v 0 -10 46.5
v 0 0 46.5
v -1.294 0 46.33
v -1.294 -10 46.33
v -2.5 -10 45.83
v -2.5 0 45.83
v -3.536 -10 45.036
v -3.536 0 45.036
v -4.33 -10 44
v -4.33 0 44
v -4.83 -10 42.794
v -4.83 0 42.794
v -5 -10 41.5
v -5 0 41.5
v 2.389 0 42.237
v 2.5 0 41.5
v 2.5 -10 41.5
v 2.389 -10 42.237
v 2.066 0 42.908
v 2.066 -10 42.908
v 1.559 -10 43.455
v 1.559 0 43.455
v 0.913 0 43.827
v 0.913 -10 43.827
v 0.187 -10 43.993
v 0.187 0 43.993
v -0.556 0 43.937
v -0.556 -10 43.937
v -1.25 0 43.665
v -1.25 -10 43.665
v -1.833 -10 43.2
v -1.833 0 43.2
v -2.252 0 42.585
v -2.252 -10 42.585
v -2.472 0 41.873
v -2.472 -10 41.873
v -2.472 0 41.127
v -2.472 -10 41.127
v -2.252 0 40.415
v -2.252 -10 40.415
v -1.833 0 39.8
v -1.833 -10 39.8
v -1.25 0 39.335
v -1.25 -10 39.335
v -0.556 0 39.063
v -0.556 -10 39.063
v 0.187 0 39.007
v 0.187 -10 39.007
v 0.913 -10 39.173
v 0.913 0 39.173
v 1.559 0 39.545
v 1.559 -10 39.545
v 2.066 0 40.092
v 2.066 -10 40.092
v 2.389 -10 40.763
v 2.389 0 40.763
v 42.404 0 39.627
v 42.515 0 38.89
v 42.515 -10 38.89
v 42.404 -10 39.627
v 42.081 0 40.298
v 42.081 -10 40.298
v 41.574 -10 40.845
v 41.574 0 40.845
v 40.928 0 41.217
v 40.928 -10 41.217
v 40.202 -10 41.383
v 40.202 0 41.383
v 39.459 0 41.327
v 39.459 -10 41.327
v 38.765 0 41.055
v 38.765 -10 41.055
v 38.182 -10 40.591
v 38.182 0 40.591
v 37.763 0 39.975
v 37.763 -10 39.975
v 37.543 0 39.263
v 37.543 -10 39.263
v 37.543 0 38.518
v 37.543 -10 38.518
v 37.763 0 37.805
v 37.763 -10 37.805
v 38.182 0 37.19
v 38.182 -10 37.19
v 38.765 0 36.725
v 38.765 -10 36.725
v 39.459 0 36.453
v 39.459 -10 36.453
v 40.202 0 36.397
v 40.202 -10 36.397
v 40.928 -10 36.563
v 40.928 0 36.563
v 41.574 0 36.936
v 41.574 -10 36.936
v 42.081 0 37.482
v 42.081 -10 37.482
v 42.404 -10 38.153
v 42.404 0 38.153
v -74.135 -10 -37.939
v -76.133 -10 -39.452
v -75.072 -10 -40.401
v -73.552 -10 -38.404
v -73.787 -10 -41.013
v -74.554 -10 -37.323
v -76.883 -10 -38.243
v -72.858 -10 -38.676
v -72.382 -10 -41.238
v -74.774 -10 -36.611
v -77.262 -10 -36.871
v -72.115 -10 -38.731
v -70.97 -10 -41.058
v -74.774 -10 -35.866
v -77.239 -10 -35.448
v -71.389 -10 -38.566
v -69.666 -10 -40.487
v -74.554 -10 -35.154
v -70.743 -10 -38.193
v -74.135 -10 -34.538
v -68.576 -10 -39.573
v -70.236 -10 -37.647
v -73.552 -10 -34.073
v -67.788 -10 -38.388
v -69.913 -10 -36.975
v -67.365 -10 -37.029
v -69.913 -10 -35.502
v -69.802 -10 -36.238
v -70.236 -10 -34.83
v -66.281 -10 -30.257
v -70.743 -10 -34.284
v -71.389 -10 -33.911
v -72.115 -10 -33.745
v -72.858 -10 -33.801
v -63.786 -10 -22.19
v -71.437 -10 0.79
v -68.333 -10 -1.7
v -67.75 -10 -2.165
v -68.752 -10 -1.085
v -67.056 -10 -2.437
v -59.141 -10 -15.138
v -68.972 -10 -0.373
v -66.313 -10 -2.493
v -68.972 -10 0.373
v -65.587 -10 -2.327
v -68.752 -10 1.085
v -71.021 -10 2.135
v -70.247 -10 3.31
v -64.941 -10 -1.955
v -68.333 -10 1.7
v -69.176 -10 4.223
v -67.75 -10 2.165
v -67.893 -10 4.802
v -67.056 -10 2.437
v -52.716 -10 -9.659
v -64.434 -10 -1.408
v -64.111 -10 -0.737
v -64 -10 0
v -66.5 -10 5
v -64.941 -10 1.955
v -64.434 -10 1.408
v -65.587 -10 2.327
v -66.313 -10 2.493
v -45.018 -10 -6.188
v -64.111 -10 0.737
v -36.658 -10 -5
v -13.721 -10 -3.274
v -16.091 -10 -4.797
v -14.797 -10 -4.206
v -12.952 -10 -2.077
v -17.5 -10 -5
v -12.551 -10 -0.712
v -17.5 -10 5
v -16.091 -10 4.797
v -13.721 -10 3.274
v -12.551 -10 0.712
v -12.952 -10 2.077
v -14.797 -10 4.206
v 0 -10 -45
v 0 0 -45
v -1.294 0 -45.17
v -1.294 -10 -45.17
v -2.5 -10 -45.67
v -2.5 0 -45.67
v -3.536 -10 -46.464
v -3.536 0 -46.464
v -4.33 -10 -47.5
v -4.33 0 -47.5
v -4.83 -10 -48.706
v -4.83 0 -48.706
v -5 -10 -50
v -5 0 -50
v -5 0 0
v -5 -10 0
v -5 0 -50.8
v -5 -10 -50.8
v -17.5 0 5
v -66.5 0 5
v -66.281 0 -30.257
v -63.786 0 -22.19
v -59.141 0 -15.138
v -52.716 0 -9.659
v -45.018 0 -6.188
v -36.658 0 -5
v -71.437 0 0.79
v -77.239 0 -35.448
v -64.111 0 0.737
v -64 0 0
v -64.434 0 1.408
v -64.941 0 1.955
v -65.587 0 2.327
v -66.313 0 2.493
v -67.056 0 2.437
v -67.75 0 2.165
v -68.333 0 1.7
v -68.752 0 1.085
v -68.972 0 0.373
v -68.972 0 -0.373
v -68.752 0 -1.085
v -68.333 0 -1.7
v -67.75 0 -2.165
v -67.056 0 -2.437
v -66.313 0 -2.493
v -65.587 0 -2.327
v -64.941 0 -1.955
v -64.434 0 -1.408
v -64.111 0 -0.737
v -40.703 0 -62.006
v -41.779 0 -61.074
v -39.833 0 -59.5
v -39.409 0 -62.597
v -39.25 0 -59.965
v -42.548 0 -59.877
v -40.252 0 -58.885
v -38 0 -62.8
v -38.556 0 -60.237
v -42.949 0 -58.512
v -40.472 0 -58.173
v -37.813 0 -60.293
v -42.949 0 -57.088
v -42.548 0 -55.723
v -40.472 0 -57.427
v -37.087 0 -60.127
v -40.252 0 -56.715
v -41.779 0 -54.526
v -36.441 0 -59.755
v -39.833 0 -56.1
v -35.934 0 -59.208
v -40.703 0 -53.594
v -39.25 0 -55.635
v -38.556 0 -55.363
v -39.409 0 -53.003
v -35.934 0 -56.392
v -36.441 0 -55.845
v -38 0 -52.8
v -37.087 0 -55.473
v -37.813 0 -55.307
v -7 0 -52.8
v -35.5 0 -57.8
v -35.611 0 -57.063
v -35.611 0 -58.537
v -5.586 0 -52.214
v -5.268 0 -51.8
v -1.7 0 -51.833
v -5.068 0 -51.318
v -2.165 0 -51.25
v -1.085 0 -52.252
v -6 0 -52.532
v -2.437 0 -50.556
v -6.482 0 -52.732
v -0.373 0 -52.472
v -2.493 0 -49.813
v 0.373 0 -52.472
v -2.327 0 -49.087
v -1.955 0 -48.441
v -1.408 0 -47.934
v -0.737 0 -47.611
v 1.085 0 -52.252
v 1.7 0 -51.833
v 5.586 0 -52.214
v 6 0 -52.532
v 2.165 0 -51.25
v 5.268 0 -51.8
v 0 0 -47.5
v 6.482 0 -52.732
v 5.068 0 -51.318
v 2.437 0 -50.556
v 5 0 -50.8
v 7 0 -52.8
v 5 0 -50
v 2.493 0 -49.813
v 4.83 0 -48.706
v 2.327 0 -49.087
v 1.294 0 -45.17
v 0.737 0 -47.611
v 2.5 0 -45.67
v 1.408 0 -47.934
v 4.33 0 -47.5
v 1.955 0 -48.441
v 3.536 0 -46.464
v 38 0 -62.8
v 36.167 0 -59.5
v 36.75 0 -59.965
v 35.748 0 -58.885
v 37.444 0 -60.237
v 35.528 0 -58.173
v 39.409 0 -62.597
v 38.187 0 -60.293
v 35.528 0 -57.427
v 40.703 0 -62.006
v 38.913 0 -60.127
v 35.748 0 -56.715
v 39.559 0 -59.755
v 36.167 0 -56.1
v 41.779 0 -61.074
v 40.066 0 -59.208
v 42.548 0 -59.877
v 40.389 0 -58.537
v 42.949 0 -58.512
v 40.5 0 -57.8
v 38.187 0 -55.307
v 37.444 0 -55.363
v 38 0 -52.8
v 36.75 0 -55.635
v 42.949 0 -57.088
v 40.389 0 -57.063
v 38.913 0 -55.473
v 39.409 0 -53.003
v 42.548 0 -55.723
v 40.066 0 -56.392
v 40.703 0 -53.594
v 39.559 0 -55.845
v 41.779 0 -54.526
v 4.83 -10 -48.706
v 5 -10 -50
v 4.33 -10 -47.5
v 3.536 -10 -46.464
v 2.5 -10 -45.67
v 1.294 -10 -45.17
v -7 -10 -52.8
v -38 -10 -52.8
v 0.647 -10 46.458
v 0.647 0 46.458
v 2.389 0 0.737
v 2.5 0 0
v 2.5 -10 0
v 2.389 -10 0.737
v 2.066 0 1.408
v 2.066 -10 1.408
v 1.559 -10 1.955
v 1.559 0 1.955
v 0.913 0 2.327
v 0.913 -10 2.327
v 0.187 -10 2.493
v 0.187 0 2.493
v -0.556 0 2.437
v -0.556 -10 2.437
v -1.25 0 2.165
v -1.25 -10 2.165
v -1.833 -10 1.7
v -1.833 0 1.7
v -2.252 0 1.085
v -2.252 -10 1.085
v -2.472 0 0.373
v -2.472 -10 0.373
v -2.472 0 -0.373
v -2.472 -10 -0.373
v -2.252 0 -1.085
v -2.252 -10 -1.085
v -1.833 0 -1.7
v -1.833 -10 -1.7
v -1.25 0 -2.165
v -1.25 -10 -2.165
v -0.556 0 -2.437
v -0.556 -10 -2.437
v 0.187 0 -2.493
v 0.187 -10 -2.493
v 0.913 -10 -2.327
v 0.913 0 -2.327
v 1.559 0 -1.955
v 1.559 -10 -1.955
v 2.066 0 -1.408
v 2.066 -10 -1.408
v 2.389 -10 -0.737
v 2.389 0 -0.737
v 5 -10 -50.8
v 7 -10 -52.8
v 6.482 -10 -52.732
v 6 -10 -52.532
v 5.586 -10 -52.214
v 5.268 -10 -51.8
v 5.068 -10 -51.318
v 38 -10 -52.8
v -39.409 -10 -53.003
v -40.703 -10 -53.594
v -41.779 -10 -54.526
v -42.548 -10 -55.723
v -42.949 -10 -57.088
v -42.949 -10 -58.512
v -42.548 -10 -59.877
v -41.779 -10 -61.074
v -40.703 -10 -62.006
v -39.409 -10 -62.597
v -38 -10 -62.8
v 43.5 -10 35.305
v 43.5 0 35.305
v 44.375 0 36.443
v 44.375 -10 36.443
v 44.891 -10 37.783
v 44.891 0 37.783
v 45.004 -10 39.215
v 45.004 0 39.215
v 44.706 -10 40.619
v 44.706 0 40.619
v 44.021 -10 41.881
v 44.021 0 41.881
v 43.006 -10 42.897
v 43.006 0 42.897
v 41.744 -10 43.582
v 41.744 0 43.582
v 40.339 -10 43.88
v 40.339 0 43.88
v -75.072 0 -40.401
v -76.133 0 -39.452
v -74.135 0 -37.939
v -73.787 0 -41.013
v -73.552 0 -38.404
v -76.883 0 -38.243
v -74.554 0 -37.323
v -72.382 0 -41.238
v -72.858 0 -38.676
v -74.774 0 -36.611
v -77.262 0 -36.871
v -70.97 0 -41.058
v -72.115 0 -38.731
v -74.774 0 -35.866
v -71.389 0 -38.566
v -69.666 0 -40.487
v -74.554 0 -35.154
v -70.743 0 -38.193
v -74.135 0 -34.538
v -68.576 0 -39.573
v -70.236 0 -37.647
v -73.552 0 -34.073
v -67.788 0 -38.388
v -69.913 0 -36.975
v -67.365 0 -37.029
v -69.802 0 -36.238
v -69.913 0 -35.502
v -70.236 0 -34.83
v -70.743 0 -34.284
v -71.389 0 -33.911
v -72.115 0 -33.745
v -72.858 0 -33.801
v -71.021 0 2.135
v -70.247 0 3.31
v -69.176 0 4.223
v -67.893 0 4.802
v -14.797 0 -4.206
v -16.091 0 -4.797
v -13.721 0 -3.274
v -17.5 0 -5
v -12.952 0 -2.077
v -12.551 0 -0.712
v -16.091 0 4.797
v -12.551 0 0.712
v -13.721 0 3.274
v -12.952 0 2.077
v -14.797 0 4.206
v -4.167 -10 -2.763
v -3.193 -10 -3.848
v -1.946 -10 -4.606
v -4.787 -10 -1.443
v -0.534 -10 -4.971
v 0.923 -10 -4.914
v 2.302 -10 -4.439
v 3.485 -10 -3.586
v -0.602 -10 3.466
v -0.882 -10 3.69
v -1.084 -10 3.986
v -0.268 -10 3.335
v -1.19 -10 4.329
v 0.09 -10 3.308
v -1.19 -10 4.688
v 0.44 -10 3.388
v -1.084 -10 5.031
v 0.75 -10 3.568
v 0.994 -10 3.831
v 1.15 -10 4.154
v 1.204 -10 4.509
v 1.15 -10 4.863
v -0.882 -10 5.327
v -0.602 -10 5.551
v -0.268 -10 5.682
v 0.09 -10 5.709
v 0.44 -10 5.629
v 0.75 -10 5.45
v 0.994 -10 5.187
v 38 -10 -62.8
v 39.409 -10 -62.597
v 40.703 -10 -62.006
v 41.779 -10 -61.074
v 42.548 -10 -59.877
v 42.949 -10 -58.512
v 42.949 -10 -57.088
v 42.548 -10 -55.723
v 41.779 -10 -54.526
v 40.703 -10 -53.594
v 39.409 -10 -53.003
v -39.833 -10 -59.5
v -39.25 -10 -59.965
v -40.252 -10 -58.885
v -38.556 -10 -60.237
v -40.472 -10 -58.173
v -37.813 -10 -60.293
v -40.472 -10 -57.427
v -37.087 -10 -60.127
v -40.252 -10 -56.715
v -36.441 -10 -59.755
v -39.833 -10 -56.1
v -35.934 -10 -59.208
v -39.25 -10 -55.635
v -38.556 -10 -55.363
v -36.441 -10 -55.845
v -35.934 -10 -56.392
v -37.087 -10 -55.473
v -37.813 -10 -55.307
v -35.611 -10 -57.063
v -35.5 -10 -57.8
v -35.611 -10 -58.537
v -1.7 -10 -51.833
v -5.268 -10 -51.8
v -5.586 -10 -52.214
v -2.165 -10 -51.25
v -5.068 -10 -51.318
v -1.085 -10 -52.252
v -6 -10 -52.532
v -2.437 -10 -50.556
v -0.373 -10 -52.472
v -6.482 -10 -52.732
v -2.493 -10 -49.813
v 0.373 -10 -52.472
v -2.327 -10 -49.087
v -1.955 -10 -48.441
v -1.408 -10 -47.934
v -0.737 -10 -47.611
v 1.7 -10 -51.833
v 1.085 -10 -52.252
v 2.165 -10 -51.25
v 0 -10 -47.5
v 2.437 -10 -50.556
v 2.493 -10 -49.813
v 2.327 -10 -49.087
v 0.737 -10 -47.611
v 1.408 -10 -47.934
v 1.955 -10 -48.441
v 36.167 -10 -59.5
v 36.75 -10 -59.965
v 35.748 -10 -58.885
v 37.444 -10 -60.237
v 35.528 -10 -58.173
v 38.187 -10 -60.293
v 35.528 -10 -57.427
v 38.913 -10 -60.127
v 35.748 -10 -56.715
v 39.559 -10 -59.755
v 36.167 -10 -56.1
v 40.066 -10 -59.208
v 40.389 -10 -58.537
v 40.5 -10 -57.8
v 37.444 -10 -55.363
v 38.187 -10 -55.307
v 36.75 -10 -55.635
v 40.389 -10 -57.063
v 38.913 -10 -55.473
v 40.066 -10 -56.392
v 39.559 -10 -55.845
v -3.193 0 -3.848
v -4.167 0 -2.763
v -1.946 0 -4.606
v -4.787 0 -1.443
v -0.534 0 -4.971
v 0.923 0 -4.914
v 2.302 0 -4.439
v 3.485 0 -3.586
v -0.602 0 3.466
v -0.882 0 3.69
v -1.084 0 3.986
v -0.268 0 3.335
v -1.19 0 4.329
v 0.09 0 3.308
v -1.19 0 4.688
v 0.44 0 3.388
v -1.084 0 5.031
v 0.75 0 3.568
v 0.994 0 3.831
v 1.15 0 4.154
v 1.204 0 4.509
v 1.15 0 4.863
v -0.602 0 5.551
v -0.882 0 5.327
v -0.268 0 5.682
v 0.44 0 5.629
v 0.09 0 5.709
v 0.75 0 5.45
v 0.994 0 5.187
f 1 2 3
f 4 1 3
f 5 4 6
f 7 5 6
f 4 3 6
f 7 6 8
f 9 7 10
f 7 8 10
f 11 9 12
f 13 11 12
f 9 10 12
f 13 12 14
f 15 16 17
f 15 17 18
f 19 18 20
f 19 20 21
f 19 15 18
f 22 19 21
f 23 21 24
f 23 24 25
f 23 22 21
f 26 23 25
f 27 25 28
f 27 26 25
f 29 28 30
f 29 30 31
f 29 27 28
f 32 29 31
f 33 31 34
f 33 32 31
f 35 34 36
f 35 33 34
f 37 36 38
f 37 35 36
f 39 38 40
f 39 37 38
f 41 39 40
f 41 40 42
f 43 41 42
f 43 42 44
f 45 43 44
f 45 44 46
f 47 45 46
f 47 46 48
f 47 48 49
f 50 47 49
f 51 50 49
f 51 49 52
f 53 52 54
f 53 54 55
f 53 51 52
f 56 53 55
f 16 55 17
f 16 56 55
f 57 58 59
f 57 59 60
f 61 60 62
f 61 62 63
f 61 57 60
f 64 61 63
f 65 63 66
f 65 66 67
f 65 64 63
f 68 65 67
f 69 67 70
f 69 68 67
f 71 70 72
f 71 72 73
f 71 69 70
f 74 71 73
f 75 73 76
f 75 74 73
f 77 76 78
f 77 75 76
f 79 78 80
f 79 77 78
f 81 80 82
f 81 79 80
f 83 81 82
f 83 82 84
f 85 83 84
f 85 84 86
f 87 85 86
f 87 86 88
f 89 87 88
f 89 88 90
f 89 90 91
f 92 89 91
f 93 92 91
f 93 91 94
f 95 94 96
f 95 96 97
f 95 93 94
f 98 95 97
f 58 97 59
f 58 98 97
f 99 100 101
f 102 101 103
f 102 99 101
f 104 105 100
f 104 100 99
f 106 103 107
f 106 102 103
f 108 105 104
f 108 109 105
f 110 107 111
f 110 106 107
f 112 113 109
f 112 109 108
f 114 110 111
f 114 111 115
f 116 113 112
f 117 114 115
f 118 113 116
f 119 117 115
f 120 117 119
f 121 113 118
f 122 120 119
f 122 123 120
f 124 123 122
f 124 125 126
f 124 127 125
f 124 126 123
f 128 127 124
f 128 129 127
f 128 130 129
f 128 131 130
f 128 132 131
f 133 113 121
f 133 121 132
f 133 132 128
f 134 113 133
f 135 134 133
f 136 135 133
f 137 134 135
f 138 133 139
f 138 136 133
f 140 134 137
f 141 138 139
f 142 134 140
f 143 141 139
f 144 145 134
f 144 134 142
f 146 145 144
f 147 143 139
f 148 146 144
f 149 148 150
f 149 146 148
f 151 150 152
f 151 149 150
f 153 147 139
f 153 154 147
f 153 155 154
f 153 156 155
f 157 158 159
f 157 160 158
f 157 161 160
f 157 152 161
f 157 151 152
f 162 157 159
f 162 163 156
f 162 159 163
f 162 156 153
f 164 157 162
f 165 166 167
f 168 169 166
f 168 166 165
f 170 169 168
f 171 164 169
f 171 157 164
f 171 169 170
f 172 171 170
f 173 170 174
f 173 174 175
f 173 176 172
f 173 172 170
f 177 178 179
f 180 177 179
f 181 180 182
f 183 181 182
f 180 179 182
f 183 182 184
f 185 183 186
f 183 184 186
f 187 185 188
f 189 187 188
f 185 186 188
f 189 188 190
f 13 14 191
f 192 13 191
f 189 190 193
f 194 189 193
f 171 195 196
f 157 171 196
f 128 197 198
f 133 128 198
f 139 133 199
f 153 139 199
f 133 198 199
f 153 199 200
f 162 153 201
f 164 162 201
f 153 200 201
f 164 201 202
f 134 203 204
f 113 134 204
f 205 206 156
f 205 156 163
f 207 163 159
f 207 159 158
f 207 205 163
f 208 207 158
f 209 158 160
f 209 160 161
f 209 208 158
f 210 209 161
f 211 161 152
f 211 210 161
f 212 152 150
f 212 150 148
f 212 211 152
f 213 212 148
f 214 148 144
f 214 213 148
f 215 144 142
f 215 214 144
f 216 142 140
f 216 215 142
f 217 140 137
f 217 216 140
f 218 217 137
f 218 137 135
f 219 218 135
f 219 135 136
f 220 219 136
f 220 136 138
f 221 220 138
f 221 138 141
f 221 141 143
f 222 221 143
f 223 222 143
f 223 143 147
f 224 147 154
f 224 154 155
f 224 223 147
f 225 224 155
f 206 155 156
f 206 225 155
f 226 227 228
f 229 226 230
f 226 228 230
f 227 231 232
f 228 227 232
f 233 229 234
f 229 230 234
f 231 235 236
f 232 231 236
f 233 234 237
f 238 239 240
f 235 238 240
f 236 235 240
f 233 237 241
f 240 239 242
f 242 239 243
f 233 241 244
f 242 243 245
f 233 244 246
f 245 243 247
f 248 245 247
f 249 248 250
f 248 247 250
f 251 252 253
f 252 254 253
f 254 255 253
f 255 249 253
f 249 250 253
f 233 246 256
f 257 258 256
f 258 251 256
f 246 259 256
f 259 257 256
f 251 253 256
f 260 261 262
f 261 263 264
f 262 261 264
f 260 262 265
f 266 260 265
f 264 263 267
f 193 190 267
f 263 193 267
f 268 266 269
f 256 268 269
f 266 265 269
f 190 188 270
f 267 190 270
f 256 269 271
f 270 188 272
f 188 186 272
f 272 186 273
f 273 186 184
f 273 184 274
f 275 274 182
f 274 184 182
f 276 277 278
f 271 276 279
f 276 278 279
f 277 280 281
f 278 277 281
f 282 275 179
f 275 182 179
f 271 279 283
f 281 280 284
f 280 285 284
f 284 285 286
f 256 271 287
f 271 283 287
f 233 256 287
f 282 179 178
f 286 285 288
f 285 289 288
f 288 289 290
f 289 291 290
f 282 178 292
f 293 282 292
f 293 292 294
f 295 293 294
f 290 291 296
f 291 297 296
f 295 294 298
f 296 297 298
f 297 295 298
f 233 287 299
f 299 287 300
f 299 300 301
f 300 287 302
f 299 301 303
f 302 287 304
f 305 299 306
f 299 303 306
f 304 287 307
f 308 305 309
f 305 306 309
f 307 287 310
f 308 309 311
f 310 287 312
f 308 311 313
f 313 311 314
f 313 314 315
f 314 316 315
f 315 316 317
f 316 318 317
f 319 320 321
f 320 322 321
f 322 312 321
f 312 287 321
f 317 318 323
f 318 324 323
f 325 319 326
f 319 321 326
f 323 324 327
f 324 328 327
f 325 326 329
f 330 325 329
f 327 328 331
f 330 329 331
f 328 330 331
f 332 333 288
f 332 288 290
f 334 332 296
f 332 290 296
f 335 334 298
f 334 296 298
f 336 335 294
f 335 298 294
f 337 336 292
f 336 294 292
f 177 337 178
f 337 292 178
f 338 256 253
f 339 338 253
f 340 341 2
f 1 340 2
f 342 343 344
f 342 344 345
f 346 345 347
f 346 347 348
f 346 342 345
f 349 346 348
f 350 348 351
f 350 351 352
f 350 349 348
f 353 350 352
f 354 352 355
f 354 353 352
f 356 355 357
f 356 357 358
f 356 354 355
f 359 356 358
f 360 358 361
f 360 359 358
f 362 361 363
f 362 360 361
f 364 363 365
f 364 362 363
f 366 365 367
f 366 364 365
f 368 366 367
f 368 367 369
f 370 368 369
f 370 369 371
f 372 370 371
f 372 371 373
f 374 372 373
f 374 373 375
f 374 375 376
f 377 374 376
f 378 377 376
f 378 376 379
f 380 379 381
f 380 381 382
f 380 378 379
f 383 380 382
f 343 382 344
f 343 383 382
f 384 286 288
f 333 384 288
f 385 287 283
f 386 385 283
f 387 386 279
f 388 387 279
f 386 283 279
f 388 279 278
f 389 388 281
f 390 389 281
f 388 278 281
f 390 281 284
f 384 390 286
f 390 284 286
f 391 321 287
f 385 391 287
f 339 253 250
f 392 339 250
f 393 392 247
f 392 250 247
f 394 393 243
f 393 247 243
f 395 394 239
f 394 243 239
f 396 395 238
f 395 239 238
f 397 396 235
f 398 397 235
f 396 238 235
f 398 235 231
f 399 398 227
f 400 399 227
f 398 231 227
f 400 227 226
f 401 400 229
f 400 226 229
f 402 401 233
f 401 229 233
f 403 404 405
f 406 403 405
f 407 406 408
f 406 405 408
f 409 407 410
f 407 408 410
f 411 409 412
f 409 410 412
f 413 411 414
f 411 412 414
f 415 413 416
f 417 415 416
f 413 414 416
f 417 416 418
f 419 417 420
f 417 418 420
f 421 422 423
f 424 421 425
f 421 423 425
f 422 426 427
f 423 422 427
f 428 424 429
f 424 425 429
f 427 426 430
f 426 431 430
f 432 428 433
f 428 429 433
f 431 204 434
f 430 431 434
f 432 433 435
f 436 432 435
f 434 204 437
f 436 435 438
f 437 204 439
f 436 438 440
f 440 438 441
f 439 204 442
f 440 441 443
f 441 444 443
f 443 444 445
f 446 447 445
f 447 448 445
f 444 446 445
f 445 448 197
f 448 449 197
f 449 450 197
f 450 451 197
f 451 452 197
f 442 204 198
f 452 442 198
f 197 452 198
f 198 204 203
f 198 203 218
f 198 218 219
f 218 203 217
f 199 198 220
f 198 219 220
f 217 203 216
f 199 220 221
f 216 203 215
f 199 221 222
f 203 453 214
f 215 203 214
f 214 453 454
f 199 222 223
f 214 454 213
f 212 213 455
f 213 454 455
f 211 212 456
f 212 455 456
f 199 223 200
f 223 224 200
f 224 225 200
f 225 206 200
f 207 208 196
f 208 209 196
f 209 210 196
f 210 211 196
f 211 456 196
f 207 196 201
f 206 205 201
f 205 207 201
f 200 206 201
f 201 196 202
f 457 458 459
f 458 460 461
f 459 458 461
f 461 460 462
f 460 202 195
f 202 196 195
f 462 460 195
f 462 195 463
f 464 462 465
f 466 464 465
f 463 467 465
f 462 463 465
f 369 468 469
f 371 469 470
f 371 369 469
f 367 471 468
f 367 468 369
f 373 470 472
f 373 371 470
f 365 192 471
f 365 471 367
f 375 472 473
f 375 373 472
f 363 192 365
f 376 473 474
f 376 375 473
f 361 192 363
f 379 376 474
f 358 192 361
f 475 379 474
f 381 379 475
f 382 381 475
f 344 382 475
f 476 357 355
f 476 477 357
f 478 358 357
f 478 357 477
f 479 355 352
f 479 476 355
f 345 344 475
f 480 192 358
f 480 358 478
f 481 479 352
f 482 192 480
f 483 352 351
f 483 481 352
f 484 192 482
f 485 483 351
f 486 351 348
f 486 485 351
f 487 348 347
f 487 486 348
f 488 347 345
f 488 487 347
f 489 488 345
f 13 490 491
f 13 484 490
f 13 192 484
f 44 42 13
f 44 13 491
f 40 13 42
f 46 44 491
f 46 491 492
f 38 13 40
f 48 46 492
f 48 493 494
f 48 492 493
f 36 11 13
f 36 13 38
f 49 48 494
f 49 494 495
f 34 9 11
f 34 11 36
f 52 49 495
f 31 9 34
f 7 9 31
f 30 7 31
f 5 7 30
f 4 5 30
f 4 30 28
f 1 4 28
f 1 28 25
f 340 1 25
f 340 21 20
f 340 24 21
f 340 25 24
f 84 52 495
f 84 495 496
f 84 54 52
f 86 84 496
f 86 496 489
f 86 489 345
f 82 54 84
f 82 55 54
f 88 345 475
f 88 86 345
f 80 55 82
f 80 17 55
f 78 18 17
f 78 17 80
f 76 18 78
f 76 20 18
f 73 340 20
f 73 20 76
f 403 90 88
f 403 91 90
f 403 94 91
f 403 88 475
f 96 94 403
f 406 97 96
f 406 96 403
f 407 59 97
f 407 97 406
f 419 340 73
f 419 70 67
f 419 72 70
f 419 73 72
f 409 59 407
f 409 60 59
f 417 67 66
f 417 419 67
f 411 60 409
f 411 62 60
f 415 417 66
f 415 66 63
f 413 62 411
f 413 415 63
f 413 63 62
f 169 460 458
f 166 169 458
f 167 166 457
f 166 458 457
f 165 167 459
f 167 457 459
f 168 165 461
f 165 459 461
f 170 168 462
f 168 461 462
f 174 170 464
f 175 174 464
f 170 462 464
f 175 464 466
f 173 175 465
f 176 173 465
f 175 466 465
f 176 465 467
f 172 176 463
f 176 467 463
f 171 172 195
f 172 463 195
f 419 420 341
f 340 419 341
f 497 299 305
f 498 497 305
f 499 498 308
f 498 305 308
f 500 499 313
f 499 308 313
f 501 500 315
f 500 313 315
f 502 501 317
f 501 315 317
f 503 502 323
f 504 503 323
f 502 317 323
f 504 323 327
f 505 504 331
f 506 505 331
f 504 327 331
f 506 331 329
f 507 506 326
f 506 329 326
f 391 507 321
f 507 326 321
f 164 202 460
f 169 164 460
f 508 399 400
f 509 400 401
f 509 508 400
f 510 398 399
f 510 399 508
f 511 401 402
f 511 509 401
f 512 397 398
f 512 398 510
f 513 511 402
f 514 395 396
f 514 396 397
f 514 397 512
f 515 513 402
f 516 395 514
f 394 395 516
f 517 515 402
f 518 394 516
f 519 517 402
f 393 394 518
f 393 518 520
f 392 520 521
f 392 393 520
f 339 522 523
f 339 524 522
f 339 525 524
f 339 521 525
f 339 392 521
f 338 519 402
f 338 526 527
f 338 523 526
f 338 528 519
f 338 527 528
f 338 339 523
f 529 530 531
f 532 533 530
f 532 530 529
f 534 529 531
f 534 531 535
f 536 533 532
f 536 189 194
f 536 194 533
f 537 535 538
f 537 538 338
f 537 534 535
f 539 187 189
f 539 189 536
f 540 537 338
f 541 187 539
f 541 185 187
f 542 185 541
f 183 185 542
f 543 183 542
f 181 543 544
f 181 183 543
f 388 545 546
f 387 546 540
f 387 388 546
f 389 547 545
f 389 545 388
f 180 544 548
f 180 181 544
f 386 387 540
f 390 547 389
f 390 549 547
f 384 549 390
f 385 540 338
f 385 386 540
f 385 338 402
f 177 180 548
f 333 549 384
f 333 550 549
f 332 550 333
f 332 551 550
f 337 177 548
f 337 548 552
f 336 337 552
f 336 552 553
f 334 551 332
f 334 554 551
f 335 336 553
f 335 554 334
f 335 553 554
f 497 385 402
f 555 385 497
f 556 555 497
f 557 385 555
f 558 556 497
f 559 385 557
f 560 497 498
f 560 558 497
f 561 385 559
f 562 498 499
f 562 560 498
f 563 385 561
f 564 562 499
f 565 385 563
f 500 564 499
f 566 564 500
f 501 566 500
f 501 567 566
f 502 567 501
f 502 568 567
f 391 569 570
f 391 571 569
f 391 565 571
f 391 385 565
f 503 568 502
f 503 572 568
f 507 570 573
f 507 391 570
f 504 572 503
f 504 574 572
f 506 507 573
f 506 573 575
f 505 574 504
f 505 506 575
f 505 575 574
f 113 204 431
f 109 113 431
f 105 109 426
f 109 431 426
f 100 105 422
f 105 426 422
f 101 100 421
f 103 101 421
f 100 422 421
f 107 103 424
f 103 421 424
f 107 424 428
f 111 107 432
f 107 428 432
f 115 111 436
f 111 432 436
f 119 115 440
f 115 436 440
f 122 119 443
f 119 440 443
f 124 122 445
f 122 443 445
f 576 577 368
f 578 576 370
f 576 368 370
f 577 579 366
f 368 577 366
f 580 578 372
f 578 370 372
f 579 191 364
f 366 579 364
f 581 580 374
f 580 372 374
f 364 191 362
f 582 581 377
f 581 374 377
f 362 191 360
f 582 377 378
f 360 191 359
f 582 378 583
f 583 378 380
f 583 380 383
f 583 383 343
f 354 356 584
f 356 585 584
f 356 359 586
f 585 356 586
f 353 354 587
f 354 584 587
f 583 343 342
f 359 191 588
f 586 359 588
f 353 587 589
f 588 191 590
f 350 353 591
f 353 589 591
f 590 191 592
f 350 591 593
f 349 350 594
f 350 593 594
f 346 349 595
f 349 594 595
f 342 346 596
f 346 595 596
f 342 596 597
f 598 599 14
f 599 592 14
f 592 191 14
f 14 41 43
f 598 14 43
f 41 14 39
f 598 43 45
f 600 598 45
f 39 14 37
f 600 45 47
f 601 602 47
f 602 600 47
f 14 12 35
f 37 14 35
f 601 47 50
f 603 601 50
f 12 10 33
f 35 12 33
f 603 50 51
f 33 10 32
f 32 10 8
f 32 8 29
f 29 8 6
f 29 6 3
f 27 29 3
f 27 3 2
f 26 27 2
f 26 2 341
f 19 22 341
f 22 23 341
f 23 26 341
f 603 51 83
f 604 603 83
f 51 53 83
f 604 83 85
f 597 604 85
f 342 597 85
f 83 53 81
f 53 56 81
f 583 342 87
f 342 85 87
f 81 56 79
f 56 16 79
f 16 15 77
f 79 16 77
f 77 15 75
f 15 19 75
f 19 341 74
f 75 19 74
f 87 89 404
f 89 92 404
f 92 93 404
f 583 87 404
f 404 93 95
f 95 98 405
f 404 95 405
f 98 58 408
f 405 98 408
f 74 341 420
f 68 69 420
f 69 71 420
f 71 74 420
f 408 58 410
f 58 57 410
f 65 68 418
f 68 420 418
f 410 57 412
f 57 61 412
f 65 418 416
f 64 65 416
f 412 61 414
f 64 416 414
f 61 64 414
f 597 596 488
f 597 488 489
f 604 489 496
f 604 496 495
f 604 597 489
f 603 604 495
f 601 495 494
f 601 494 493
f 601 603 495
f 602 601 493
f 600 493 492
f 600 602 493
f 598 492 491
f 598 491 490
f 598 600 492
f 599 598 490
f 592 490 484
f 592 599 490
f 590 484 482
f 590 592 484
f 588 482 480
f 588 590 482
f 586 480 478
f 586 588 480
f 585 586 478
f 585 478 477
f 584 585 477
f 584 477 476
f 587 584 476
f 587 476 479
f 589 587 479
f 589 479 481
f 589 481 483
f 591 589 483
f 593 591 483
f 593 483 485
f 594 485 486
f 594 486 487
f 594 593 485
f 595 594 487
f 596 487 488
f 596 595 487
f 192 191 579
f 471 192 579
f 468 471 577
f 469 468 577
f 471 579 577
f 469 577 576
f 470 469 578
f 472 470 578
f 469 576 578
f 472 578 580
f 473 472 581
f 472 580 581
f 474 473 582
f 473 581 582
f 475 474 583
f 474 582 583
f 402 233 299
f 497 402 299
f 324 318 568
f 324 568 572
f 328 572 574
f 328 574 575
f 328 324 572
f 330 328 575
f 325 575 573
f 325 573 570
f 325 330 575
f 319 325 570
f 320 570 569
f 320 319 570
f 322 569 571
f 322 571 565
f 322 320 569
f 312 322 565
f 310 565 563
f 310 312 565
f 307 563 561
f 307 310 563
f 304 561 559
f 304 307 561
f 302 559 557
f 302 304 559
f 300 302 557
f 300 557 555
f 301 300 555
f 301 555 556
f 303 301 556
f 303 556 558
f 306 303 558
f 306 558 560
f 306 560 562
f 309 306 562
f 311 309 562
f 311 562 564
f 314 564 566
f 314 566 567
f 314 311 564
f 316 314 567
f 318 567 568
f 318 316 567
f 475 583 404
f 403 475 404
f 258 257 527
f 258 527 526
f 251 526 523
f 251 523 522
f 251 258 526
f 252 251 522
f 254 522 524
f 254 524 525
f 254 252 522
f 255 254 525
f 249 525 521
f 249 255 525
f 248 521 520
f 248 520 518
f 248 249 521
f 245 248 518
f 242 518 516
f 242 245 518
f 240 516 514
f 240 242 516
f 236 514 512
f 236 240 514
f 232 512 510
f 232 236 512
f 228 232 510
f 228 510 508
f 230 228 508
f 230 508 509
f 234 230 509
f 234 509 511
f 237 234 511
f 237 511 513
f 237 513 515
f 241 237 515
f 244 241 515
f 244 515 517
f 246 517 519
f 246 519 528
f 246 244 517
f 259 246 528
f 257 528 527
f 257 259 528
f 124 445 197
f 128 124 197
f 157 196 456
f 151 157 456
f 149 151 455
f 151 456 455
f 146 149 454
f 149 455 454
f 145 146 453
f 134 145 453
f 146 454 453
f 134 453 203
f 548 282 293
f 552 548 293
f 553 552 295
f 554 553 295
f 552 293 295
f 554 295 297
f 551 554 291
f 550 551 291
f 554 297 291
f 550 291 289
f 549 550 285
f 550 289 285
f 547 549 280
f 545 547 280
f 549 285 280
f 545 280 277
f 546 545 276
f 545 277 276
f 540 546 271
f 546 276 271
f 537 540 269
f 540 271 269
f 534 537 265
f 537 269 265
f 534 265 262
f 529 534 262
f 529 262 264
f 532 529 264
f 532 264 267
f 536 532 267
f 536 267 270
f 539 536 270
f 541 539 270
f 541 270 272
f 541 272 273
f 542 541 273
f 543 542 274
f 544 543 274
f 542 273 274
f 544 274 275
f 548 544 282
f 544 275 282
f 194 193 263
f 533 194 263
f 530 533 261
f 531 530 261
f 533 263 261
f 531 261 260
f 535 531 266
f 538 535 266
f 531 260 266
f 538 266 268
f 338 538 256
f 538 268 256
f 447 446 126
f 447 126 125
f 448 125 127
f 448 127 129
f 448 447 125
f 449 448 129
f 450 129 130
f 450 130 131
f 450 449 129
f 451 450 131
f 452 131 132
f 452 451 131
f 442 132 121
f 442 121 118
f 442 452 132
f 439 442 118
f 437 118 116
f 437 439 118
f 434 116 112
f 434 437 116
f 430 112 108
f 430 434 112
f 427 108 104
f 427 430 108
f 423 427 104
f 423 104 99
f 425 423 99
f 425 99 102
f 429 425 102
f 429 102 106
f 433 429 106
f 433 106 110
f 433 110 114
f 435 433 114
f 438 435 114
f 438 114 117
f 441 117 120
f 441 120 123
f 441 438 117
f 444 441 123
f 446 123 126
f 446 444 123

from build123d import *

# Parameters (mm, degrees)
F0_R     = 2.5
F0_R_2   = 1.203596
F1_DEPTH = 10
F2_R     = 2.5
F4_DEPTH = 10
F3_R     = 2.5
F5_DEPTH = 10


with BuildPart() as f1:
    # F0 (on Front) → F1 (new body)
    with BuildSketch(Plane.XZ):
        with BuildLine():
            Line((40.339092, 43.879605), (0.646863, 46.45798))
            Line((0.646863, 46.45798), (0, 46.5))
            ThreePointArc((0, 46.5), (-3.535534, 45.035534), (-5, 41.5))
            Line((-5, 41.5), (-5, 0))
            ThreePointArc((-5, 0), (-1.946293, -4.605643), (3.484778, -3.585572))
            Line((3.484778, -3.585572), (43.499757, 35.304549))
            ThreePointArc((43.499757, 35.304549), (44.70644, 40.619338), (40.339092, 43.879605))
        make_face()
        Circle(F0_R, mode=Mode.SUBTRACT)
        with Locations((0, 4.508609)):
            Circle(F0_R_2, mode=Mode.SUBTRACT)
        with Locations((0, 41.5)):
            Circle(F0_R, mode=Mode.SUBTRACT)
        with Locations((40.014979, 38.89012)):
            Circle(F0_R, mode=Mode.SUBTRACT)
    extrude(amount=F1_DEPTH)


with BuildPart() as f4:
    # F2 (on Front) → F4 (new body)
    with BuildSketch(Plane.XZ):
        with BuildLine():
            Line((-36.657991, -5), (-17.5, -5))
            ThreePointArc((-17.5, -5), (-12.5, 0), (-17.5, 5))
            Line((-17.5, 5), (-66.5, 5))
            ThreePointArc((-66.5, 5), (-69.744045, 3.804756), (-71.437121, 0.790469))
            Line((-71.437121, 0.790469), (-77.239161, -35.447996))
            ThreePointArc((-77.239161, -35.447996), (-73.09251, -41.175585), (-67.36492, -37.028933))
            Line((-67.36492, -37.028933), (-66.280715, -30.257187))
            ThreePointArc((-66.280715, -30.257187), (-56.122262, -12.171461), (-36.657991, -5))
        make_face()
        with Locations((-72.302041, -36.238465)):
            Circle(F2_R, mode=Mode.SUBTRACT)
        with Locations((-66.5, 0)):
            Circle(F2_R, mode=Mode.SUBTRACT)
    extrude(amount=F4_DEPTH)


with BuildPart() as f5:
    # F3 (on Front) → F5 (new body)
    with BuildSketch(Plane.XZ):
        with BuildLine():
            Line((-7, -52.8), (-38, -52.8))
            ThreePointArc((-38, -52.8), (-43, -57.8), (-38, -62.8))
            Line((-38, -62.8), (0, -62.8))
            Line((0, -62.8), (38, -62.8))
            ThreePointArc((38, -62.8), (43, -57.8), (38, -52.8))
            Line((38, -52.8), (7, -52.8))
            ThreePointArc((7, -52.8), (5.585786, -52.214214), (5, -50.8))
            Line((5, -50.8), (5, -50))
            ThreePointArc((5, -50), (3.535534, -46.464466), (0, -45))
            ThreePointArc((0, -45), (-3.535534, -46.464466), (-5, -50))
            Line((-5, -50), (-5, -50.8))
            ThreePointArc((-5, -50.8), (-5.585786, -52.214214), (-7, -52.8))
        make_face()
        with Locations((-38, -57.8)):
            Circle(F3_R, mode=Mode.SUBTRACT)
        with Locations((38, -57.8)):
            Circle(F3_R, mode=Mode.SUBTRACT)
        with BuildLine():
            ThreePointArc((0, -52.5), (-2.5, -50), (0, -47.5))
            ThreePointArc((0, -47.5), (2.5, -50), (0, -52.5))
        make_face(mode=Mode.SUBTRACT)
    extrude(amount=F5_DEPTH)


solid = Compound([f1.part, f4.part, f5.part])
